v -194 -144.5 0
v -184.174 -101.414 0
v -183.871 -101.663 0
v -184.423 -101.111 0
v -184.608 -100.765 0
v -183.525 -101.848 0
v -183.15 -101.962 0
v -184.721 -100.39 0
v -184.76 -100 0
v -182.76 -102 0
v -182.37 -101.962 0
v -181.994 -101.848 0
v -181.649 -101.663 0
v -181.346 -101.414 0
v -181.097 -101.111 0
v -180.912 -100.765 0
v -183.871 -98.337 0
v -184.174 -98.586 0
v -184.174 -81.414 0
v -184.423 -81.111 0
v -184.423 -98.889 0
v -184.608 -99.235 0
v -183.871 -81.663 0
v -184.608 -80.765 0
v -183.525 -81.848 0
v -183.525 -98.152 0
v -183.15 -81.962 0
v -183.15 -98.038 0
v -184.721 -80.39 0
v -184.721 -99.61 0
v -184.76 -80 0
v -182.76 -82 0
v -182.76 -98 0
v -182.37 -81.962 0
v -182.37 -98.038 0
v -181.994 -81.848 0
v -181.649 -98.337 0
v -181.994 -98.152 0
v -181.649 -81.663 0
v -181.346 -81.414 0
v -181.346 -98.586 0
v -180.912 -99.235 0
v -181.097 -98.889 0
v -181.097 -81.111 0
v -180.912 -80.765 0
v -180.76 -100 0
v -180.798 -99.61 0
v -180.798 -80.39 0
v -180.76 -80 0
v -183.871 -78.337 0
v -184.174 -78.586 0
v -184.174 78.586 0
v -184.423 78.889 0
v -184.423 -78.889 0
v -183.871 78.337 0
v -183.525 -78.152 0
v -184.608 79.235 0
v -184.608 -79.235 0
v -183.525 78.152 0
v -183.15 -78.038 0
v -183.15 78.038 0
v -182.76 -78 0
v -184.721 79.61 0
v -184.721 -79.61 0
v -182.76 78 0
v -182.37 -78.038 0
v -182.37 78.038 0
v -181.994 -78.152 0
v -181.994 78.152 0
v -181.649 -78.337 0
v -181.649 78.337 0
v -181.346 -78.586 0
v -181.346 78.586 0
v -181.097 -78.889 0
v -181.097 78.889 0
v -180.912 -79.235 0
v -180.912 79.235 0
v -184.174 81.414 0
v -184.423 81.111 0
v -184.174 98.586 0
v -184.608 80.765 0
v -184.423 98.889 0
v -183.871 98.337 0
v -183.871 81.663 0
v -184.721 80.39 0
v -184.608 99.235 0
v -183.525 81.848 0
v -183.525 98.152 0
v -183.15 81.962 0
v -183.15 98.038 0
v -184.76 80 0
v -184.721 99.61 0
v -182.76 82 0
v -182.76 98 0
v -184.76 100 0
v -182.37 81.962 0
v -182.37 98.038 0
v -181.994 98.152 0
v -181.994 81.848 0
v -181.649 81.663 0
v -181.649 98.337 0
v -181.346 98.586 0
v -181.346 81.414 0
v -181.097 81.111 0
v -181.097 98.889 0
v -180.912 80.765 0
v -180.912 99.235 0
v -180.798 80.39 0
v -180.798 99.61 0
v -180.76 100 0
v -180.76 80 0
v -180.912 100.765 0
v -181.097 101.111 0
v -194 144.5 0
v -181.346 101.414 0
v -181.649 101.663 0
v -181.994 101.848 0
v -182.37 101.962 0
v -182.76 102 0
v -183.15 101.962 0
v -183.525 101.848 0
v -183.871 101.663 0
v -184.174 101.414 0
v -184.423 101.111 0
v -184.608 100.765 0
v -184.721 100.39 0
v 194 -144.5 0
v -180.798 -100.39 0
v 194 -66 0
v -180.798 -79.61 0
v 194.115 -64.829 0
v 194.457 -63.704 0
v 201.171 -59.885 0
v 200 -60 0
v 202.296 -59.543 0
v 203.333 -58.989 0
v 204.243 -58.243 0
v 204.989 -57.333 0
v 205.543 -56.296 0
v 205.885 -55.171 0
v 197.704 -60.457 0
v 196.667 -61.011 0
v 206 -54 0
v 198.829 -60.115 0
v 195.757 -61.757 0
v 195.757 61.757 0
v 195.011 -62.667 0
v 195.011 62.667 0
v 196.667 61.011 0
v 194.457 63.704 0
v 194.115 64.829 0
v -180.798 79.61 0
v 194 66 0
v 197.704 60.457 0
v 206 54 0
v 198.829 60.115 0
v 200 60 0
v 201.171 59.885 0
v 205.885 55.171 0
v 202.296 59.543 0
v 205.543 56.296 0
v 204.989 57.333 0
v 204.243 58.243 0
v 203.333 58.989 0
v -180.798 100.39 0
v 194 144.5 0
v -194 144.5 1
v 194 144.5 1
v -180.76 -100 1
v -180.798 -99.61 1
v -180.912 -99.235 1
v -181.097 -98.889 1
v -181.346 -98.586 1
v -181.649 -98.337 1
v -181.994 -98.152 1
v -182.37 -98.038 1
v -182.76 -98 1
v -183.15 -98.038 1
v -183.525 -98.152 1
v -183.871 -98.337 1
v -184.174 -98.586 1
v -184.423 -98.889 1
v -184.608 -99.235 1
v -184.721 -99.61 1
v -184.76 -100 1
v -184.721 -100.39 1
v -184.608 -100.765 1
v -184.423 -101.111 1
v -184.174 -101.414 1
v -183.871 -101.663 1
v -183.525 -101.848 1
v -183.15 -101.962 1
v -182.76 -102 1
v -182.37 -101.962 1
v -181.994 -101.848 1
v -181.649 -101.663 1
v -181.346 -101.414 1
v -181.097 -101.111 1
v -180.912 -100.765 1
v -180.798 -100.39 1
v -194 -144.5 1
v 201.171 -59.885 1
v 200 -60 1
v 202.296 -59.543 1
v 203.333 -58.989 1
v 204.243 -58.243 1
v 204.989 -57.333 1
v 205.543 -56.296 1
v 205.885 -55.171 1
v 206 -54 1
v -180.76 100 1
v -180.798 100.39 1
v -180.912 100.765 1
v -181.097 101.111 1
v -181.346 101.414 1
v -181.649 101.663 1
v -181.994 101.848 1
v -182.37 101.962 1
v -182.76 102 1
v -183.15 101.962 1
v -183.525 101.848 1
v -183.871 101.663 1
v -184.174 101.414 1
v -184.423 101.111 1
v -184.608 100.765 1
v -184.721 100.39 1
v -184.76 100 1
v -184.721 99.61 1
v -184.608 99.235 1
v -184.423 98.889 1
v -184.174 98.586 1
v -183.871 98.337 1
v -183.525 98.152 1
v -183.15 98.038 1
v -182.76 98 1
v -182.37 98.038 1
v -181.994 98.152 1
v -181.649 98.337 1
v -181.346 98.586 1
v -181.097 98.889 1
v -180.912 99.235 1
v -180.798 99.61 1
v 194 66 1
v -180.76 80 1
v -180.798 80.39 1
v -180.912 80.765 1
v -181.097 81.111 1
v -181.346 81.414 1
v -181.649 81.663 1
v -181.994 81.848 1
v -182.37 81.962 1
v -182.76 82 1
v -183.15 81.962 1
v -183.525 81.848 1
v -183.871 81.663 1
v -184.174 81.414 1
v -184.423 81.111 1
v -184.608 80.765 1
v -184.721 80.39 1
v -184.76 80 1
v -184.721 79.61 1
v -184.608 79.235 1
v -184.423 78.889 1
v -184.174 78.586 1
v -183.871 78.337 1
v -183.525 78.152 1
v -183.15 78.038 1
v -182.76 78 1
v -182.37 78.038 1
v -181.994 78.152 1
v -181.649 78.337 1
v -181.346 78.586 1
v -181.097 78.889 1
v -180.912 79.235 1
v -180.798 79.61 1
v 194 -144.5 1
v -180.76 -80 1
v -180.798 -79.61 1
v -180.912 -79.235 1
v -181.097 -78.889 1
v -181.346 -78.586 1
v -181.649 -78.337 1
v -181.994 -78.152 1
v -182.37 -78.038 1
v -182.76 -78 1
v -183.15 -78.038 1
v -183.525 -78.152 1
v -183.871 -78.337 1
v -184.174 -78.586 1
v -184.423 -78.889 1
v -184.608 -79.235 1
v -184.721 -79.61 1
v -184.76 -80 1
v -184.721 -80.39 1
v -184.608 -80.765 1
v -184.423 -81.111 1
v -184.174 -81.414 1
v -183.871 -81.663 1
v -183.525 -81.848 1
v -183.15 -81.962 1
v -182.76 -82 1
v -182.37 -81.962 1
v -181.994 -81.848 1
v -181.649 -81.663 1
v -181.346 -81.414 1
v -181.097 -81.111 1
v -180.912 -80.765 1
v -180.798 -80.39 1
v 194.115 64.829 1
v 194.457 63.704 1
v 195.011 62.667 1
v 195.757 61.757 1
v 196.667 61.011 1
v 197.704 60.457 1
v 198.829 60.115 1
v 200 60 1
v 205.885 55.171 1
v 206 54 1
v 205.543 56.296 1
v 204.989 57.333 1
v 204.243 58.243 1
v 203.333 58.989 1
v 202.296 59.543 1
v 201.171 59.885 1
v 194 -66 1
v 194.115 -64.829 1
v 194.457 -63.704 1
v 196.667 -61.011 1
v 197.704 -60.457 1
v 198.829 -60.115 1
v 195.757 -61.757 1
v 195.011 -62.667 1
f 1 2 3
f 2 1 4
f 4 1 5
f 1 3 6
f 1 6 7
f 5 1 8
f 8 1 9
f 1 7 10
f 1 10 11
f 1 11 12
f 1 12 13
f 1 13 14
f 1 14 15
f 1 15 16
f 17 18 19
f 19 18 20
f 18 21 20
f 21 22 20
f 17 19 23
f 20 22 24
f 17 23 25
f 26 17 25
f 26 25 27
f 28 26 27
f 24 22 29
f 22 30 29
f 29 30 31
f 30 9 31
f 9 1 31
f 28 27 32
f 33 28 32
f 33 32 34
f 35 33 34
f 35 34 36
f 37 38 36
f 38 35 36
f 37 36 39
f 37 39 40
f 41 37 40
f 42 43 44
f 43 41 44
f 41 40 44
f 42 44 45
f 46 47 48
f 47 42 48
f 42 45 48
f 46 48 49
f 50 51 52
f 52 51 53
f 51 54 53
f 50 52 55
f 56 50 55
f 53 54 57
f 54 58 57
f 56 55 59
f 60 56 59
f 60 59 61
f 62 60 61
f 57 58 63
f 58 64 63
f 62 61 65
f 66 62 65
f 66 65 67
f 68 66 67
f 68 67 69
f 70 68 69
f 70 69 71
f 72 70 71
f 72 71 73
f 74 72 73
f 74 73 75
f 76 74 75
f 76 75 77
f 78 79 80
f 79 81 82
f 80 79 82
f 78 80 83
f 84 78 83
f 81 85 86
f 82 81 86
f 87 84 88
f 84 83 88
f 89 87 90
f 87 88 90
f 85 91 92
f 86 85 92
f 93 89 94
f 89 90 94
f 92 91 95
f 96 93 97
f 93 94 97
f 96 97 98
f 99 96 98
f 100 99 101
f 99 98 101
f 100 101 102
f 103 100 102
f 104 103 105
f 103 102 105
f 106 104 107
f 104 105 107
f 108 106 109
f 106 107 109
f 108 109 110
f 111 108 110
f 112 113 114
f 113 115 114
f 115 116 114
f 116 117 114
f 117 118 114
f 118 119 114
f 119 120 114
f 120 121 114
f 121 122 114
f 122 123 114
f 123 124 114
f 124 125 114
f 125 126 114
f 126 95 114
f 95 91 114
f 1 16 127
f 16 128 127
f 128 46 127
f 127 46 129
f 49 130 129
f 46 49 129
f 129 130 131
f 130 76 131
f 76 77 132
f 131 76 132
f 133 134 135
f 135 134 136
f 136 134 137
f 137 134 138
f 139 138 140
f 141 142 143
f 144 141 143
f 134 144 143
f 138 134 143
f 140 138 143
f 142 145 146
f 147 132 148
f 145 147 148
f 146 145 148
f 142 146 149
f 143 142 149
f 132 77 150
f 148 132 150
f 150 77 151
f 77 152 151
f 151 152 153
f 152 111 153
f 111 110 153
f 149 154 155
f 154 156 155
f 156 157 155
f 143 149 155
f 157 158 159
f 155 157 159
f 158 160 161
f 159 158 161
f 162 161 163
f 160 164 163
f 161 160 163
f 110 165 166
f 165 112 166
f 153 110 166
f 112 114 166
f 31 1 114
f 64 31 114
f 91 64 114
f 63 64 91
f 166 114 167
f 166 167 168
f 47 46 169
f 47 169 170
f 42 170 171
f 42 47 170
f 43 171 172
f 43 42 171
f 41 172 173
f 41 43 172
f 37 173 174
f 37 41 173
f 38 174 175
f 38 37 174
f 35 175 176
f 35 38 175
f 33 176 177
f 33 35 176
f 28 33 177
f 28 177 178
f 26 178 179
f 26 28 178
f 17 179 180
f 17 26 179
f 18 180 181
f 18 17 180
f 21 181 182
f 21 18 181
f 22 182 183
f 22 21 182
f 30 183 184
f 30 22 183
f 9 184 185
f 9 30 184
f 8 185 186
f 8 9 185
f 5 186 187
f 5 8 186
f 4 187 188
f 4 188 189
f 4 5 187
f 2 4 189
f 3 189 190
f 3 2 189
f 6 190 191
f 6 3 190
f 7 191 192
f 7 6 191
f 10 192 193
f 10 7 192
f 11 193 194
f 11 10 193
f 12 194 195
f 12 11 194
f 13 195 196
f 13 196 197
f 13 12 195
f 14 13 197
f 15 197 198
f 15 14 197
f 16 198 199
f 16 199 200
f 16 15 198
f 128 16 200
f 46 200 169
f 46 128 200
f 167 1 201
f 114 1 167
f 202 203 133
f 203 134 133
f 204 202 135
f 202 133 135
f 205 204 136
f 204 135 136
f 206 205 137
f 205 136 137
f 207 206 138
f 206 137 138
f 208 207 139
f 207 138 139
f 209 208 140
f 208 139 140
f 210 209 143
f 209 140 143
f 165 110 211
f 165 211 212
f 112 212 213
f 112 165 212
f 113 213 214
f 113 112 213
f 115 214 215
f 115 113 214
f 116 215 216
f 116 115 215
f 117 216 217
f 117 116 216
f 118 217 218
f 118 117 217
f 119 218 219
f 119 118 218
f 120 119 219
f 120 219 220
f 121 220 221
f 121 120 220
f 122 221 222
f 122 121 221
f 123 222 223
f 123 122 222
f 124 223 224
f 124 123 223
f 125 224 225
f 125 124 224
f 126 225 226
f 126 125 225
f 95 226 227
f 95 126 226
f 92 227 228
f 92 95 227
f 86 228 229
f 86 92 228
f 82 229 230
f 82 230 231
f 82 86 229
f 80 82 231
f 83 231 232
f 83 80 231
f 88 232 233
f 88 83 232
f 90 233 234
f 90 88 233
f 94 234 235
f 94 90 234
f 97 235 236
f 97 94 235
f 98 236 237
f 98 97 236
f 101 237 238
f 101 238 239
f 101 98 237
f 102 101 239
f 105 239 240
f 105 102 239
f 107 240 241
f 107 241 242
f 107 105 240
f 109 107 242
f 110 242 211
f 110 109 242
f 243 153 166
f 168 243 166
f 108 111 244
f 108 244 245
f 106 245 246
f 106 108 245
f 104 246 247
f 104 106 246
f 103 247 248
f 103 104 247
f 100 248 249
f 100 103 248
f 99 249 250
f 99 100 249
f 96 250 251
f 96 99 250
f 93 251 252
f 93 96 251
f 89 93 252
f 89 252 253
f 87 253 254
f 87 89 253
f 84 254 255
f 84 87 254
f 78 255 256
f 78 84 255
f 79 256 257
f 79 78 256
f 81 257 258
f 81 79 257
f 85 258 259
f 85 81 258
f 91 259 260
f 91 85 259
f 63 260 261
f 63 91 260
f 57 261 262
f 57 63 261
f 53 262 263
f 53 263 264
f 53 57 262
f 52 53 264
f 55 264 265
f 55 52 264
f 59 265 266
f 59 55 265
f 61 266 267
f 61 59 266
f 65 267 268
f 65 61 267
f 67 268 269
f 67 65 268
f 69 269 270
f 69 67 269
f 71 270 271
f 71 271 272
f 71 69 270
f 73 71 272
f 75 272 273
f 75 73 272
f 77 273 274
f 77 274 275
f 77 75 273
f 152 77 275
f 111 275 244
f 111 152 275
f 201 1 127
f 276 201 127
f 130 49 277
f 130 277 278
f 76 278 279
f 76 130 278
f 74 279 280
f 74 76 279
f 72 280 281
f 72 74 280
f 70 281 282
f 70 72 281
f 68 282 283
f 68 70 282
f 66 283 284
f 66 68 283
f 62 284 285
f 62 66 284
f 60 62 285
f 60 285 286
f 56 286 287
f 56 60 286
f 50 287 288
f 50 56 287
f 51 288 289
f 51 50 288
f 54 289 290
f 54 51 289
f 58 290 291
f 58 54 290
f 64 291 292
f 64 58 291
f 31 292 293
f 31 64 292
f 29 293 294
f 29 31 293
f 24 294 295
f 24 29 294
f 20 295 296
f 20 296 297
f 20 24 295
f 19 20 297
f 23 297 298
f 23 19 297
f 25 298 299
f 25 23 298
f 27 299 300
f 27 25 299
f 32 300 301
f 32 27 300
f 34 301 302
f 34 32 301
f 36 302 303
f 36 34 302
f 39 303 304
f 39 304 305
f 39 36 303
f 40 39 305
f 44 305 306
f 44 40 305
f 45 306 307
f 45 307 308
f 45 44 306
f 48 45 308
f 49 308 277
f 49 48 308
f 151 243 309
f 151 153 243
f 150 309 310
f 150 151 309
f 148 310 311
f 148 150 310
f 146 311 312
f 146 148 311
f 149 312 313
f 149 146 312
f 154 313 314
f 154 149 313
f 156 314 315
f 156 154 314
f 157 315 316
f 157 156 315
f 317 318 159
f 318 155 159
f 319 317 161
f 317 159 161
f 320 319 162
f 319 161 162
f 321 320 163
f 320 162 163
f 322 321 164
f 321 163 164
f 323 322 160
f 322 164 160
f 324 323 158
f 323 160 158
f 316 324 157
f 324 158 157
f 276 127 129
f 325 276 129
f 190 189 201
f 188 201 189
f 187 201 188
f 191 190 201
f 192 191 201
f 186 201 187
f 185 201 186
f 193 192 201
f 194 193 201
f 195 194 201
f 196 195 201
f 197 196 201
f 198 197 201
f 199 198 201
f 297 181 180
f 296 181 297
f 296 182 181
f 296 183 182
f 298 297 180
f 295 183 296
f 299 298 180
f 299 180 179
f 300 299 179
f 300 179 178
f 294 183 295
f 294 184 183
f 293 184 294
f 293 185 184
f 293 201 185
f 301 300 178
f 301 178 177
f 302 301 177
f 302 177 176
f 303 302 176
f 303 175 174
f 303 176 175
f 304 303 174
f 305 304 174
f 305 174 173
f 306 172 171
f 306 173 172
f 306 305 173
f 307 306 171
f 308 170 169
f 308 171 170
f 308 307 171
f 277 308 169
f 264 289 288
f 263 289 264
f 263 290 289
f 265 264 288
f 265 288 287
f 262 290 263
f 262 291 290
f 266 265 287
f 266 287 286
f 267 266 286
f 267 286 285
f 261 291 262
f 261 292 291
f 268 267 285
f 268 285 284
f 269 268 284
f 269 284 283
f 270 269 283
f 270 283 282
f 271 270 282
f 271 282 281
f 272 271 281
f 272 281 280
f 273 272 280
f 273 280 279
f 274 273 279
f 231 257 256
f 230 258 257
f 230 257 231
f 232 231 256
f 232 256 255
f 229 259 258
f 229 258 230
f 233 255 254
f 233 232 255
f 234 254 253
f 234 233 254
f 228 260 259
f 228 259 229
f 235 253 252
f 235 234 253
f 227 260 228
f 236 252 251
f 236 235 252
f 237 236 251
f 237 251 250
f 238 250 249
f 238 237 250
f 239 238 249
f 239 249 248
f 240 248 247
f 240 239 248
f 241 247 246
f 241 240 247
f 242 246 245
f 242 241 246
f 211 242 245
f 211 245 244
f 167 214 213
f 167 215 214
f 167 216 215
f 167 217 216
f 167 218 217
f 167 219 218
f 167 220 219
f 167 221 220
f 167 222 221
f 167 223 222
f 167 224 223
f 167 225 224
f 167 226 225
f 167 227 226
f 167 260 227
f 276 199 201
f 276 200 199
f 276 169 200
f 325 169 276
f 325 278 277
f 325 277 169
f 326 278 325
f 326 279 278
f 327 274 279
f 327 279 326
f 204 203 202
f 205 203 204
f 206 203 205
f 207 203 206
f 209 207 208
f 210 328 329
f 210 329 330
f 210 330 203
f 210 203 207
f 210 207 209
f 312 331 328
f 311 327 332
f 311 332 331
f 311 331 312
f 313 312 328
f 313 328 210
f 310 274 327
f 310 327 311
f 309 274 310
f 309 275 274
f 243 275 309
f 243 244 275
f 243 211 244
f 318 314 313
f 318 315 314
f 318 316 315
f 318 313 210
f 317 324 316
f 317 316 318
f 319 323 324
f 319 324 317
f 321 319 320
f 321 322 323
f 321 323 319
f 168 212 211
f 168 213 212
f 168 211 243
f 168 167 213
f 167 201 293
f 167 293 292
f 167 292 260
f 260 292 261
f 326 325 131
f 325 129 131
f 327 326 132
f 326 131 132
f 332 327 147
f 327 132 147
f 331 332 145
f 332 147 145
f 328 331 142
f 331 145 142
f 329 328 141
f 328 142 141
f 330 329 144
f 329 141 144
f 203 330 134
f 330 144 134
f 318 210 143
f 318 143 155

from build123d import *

# Parameters (mm, degrees)
SKETCH1_W           = 388
SKETCH1_H           = 289
SKETCH1_R           = 2
BOSS_EXTRUDE1_DEPTH = 1
SKETCH3_W           = 12
SKETCH3_H           = 120
BOSS_EXTRUDE2_DEPTH = 1
FILLET1_R           = 6


with BuildPart() as part:
    # Sketch1 → Boss-Extrude1 (new body)
    with BuildSketch(Plane.XY):
        Rectangle(SKETCH1_W, SKETCH1_H)
        with Locations((-182.759742869, 100.000000002)):
            Circle(SKETCH1_R, mode=Mode.SUBTRACT)
        with Locations((-182.759742868, 80.000000002)):
            Circle(SKETCH1_R, mode=Mode.SUBTRACT)
        with Locations((-182.759742869, -100)):
            Circle(SKETCH1_R, mode=Mode.SUBTRACT)
        with Locations((-182.759742869, -80)):
            Circle(SKETCH1_R, mode=Mode.SUBTRACT)
    extrude(amount=BOSS_EXTRUDE1_DEPTH)

    # Sketch3 → Boss-Extrude2 (add)
    with BuildSketch(Plane.XY.offset(1)):
        with Locations((200, 0)):
            Rectangle(SKETCH3_W, SKETCH3_H)
    extrude(amount=-BOSS_EXTRUDE2_DEPTH)

    # Fillet1
    fillet1_edges = [part.edges().sort_by_distance(p)[0] for p in [
        (194, -60, 0.5),
        (194, 60, 0.5),
    ]]
    fillet(fillet1_edges, radius=FILLET1_R)
    fillet1_2_edges = [part.edges().sort_by_distance(p)[0] for p in [
        (206, -60, 0.5),
        (206, 60, 0.5),
    ]]
    fillet(fillet1_2_edges, radius=FILLET1_R - 0.0001)  # a hair under: the kernel refuses the full size


solid = part.part
